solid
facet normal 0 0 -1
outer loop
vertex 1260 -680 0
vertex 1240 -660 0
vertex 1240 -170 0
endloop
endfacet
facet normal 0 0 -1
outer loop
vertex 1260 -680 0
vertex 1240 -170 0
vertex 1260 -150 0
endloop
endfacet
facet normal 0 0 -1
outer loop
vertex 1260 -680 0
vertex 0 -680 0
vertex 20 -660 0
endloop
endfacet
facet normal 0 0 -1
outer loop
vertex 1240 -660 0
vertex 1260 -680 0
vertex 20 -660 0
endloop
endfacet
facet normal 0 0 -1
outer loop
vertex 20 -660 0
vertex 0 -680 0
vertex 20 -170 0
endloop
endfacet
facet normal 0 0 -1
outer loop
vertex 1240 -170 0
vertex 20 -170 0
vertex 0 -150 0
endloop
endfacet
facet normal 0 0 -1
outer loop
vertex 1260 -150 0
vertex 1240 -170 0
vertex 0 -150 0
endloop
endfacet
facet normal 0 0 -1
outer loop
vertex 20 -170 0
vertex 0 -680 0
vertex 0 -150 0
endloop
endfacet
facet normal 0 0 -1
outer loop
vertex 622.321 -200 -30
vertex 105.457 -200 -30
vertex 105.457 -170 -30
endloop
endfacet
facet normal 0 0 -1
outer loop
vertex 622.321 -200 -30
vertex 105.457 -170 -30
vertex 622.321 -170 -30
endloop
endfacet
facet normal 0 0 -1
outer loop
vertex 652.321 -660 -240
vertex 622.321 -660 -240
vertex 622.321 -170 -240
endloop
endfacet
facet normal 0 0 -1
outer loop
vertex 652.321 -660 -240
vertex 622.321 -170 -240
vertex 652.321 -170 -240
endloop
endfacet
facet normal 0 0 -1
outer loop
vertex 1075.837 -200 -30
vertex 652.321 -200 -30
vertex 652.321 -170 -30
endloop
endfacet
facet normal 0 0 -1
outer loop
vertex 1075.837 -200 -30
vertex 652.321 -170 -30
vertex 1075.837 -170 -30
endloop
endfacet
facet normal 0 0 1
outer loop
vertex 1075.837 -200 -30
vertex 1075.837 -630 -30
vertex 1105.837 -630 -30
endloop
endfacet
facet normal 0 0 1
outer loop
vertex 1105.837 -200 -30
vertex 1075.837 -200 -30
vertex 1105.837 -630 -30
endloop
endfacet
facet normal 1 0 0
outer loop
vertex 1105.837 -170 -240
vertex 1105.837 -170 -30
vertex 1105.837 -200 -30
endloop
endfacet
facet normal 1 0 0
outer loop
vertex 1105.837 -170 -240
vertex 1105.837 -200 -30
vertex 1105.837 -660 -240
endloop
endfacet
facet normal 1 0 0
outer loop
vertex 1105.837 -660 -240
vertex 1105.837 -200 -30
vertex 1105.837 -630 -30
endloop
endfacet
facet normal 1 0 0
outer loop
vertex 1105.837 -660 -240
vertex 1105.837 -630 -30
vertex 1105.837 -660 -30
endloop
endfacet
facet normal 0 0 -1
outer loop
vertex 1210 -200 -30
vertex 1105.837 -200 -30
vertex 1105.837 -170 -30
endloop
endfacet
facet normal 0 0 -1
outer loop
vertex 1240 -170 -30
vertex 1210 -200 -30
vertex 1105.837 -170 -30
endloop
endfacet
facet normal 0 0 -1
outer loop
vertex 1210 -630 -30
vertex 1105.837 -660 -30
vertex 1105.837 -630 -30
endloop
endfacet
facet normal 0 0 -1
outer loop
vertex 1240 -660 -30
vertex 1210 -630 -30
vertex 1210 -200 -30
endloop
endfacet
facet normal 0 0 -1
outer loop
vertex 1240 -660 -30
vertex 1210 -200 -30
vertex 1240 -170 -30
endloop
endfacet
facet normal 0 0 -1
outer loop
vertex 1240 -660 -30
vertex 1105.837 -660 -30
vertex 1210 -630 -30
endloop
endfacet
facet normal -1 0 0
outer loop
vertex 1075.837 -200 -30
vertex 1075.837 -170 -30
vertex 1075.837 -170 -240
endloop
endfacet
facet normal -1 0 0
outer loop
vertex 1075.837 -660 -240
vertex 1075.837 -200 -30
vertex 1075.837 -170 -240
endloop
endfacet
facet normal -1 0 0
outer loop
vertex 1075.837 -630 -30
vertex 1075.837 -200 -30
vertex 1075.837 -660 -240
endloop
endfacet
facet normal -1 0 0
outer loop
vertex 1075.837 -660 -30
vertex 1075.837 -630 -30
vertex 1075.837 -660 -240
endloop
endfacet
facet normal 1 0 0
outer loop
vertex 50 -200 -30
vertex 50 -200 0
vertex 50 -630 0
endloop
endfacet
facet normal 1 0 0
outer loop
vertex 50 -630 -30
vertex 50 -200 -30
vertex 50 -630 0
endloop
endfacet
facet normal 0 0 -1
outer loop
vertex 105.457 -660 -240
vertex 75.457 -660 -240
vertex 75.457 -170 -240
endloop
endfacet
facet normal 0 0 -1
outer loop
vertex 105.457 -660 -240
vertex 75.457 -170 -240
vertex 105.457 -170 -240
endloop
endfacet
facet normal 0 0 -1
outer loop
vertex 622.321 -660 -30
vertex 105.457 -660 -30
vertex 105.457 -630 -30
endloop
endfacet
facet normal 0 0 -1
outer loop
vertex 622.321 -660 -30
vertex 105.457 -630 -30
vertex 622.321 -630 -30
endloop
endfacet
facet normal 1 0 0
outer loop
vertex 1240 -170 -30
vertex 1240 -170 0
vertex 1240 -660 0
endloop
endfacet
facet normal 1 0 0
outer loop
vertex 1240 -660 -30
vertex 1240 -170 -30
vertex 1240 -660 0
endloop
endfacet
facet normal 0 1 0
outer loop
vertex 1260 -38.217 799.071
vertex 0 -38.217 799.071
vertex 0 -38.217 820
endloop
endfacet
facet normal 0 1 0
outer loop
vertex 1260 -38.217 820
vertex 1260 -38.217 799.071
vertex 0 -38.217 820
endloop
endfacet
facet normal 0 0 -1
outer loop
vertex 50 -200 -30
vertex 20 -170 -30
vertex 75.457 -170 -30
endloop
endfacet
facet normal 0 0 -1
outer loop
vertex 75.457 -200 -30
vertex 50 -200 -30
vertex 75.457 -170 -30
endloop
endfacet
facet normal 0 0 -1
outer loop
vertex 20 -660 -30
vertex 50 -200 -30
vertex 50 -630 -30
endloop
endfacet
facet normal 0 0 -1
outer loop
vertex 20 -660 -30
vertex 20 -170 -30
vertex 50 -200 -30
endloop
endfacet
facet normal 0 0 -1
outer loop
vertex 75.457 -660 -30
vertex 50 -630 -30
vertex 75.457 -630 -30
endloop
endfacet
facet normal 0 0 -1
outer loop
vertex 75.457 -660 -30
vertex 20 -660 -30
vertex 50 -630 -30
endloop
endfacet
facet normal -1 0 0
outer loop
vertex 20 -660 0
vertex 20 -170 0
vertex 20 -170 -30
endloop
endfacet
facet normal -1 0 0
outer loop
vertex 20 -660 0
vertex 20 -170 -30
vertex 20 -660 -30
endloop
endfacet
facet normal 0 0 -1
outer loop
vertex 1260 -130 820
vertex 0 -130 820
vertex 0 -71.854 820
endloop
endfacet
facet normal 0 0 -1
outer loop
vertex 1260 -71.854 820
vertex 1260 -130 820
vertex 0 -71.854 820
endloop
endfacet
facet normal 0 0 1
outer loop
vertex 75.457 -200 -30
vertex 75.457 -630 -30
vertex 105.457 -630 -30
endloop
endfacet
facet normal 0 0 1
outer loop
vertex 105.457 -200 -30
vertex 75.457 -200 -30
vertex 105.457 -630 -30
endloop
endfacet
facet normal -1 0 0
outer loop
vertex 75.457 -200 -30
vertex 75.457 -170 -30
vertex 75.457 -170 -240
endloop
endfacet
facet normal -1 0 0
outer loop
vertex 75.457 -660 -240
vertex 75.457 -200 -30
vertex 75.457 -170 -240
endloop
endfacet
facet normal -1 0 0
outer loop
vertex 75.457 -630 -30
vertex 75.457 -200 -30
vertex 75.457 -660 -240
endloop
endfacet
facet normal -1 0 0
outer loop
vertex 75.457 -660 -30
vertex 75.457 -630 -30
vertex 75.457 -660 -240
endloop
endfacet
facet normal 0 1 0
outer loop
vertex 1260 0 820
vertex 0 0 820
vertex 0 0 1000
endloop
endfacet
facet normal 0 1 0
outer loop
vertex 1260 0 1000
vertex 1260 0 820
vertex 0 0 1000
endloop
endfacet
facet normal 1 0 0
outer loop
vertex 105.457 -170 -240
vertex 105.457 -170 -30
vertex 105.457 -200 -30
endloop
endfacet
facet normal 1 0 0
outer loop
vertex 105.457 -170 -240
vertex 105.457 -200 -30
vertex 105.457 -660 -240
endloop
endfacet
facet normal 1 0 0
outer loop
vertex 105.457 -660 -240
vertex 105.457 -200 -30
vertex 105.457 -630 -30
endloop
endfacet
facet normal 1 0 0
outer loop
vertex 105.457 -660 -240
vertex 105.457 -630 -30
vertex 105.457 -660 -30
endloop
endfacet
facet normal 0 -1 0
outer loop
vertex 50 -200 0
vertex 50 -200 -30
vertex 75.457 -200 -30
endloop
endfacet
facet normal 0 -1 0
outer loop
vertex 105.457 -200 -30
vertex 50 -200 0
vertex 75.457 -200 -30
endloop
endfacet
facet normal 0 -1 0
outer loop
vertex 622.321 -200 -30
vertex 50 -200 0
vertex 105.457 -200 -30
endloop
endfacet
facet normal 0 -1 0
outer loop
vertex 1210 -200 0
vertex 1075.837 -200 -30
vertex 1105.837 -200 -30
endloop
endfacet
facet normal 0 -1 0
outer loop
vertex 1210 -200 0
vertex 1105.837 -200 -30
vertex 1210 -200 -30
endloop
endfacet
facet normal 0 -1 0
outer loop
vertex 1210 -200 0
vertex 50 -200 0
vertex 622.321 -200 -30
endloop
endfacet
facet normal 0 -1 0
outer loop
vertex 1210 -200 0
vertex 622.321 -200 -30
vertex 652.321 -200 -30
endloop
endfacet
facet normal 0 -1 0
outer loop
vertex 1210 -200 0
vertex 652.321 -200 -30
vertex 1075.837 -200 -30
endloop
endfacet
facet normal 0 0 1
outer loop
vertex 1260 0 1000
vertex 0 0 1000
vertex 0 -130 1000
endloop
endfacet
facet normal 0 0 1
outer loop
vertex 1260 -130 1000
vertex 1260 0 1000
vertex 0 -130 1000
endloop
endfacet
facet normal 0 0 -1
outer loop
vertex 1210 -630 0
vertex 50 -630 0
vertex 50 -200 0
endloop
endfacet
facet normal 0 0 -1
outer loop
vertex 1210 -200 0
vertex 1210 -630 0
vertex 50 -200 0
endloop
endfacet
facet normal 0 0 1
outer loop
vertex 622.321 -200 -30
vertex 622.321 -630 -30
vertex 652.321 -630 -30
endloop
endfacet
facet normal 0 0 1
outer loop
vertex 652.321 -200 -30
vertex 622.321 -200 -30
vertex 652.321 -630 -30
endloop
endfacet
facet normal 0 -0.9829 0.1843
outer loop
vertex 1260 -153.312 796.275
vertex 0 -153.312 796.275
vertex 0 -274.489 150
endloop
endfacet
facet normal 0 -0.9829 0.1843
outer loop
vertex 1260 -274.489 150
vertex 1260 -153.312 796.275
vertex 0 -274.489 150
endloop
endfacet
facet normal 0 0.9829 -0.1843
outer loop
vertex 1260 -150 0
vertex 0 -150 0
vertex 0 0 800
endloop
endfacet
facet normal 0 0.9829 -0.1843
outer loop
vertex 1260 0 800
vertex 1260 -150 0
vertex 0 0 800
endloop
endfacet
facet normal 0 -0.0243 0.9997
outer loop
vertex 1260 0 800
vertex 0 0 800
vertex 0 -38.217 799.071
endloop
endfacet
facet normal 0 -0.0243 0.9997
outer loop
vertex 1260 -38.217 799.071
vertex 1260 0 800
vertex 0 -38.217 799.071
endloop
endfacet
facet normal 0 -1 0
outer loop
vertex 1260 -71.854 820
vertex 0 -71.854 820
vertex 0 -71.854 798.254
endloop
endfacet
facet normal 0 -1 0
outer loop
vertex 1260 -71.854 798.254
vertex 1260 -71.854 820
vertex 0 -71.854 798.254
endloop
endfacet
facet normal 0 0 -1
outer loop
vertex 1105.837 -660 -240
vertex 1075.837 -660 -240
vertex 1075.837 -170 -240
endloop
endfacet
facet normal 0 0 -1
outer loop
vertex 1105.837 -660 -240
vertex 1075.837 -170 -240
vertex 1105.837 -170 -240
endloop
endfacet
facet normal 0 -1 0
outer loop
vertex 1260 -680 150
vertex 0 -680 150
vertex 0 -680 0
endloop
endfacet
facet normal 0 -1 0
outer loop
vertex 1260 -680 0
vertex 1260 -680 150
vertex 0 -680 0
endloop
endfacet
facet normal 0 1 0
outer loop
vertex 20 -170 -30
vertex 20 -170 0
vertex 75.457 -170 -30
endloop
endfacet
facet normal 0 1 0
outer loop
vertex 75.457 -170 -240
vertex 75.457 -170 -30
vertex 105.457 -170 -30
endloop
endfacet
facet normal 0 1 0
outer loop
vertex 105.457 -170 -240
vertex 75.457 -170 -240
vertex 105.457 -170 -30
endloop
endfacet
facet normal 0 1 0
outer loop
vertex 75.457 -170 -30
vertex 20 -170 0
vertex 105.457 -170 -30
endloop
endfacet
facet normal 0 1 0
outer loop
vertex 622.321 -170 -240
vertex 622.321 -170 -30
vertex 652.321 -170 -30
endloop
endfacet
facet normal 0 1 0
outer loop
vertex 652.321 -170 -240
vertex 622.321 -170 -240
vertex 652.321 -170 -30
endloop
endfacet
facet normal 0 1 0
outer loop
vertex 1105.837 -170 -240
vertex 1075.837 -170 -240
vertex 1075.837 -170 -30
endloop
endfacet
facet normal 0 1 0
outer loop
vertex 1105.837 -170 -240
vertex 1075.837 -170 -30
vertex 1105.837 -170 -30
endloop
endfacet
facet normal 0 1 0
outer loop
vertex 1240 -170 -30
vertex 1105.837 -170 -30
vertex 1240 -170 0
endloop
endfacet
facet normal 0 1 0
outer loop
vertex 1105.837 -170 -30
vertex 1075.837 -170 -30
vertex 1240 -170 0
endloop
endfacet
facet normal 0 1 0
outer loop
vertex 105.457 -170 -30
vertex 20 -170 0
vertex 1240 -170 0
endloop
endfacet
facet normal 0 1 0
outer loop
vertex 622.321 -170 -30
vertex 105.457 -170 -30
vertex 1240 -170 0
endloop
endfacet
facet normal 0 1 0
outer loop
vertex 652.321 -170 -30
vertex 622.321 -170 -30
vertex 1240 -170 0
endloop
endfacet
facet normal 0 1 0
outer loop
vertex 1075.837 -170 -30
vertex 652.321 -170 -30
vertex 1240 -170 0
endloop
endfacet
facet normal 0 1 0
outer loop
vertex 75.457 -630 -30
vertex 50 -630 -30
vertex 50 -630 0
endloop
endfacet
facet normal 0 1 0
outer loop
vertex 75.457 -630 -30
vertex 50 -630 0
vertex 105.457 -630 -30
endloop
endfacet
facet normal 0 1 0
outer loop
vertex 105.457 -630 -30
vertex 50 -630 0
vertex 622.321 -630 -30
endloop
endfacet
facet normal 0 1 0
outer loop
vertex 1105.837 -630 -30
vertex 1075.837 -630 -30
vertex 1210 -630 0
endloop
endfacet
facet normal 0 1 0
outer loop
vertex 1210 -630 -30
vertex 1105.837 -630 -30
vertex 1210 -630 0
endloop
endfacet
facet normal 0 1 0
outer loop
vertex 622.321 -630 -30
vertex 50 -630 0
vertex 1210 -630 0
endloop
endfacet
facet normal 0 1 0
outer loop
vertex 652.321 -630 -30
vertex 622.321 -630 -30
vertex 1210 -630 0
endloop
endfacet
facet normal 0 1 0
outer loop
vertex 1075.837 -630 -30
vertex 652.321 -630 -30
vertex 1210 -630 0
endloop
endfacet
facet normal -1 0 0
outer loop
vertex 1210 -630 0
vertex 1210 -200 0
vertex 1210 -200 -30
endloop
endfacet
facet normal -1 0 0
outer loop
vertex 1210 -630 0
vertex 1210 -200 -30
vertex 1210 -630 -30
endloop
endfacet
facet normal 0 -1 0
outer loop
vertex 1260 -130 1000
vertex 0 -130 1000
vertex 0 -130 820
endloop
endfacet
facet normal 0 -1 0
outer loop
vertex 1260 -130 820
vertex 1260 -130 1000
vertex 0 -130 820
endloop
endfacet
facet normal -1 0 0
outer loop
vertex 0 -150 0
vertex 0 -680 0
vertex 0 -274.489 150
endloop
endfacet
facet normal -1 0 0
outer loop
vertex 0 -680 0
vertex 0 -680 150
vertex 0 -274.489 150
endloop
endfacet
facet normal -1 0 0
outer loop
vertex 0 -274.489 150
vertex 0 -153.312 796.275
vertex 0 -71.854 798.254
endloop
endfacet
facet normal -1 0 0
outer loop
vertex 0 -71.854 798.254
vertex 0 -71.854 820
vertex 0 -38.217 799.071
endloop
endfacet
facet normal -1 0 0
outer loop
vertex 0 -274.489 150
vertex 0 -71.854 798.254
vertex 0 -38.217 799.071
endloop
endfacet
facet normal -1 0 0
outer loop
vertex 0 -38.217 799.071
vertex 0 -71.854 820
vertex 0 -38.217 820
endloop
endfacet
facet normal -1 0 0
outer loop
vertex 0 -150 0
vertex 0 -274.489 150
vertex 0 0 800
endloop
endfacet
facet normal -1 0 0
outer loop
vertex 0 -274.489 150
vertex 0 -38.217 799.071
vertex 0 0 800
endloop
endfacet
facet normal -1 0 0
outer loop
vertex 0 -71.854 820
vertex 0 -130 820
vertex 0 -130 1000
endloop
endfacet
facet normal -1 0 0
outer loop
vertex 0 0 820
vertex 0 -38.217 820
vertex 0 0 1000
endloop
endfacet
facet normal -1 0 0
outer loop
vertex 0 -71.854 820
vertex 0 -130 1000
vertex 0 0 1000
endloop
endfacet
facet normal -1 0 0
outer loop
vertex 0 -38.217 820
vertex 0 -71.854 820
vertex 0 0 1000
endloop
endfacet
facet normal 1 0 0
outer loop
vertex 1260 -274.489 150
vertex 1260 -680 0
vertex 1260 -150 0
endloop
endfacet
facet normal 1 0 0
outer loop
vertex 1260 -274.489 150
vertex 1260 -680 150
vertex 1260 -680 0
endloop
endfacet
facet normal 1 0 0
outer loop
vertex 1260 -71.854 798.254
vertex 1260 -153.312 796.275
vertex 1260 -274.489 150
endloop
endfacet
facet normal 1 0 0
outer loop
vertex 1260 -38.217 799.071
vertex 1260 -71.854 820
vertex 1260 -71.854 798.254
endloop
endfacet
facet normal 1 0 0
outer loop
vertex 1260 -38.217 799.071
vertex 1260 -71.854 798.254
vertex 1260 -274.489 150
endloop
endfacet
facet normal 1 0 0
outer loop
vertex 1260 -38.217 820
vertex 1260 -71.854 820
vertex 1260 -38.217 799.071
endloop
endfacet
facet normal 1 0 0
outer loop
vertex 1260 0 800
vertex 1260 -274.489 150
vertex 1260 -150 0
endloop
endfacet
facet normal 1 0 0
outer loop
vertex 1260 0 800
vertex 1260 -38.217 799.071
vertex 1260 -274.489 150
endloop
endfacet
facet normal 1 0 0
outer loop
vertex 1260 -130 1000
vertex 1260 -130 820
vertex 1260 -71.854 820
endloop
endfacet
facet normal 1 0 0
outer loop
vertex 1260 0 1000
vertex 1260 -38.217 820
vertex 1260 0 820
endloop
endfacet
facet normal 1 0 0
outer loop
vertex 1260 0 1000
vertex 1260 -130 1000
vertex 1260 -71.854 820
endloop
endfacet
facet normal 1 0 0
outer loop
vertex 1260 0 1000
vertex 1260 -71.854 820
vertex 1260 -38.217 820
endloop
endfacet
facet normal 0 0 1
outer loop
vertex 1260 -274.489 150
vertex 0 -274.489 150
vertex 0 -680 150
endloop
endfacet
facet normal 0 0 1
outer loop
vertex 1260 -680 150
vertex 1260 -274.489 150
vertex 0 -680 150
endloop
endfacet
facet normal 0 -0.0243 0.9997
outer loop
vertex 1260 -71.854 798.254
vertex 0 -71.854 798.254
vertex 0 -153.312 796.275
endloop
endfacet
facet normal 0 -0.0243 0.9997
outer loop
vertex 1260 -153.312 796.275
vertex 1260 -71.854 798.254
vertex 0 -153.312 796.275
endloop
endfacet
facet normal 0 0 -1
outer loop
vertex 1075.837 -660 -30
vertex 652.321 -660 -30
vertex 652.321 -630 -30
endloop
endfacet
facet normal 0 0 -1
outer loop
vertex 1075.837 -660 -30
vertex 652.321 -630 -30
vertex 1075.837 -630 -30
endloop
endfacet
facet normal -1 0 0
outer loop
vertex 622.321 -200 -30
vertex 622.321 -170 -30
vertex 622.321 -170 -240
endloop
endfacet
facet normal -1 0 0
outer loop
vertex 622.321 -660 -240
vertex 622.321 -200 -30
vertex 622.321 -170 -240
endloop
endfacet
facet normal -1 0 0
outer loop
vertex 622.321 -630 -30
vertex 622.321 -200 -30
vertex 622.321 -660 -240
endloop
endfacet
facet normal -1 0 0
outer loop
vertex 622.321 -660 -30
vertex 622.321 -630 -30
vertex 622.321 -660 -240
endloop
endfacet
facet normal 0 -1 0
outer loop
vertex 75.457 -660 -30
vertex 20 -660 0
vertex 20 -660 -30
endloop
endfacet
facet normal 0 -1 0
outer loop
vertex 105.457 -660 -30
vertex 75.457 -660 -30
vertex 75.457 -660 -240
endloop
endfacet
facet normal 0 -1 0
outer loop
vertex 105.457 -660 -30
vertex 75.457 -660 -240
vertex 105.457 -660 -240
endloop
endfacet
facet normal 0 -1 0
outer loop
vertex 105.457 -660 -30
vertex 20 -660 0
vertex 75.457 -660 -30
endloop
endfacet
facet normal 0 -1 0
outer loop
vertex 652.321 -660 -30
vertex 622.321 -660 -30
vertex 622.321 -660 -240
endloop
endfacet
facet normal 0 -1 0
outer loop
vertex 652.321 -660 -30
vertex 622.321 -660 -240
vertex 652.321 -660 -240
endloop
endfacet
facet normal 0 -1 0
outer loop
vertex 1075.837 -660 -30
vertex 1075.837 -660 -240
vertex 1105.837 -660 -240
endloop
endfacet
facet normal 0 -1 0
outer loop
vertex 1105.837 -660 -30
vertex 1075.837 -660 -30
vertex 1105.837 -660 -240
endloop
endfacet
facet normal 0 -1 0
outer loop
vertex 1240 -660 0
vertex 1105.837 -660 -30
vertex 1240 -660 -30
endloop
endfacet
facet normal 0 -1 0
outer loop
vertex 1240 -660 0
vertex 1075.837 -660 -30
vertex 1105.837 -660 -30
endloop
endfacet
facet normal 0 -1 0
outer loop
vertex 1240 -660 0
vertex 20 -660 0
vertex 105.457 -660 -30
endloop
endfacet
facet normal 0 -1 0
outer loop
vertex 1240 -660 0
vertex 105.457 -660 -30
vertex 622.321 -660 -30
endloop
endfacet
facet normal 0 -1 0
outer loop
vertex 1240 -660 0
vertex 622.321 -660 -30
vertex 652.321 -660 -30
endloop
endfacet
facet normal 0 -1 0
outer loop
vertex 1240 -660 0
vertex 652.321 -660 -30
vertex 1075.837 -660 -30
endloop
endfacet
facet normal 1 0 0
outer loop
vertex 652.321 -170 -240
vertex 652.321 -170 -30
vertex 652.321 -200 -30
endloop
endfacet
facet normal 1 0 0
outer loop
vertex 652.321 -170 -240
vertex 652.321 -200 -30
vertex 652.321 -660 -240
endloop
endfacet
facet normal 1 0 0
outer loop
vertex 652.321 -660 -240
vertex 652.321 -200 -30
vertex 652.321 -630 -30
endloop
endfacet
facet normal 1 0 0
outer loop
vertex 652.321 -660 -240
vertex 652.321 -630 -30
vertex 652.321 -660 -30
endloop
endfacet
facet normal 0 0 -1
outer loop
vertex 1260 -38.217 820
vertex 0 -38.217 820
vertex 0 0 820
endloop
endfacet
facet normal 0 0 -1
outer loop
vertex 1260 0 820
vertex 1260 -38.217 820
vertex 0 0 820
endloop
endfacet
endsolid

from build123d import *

# Parameters (mm, degrees)
F1_DEPTH = 1260
F2_W     = 1220
F2_H     = 490
F2_W_2   = 1160
F2_H_2   = 430
F3_DEPTH = 30
F4_W     = 30
F4_H     = 490
F5_DEPTH = 210


with BuildPart() as f1:
    # F0 (on Right) → F1 (new body)
    with BuildSketch(Plane.YZ):
        Polygon((-680, 0), (-150, 0), (0, 800), (-38.217112, 799.071343), (-38.217112, 820), (0, 820), (0, 1000), (-130, 1000), (-130, 820), (-71.854167, 820), (-71.854167, 798.25398), (-153.312458, 796.274585), (-274.488943, 150), (-680, 150), align=None)
    extrude(amount=F1_DEPTH)

    # F2 (on face) → F3 (join)
    with BuildSketch(Plane(origin=(0, 0, 0), x_dir=(1, 0, 0), z_dir=(0, 0, -1))):
        with Locations((630, 415)):
            Rectangle(F2_W, F2_H)
        with Locations((630, 415)):
            Rectangle(F2_W_2, F2_H_2, mode=Mode.SUBTRACT)
    extrude(amount=F3_DEPTH)

    # F4 (on face) → F5 (join)
    with BuildSketch(Plane(origin=(0, 0, -30), x_dir=(1, 0, 0), z_dir=(0, 0, -1))):
        with Locations((1090.837493, 415)):
            Rectangle(F4_W, F4_H)
        with Locations((637.32095, 415)):
            Rectangle(F4_W, F4_H)
        with Locations((90.456768, 415)):
            Rectangle(F4_W, F4_H)
    extrude(amount=F5_DEPTH)


solid = f1.part
